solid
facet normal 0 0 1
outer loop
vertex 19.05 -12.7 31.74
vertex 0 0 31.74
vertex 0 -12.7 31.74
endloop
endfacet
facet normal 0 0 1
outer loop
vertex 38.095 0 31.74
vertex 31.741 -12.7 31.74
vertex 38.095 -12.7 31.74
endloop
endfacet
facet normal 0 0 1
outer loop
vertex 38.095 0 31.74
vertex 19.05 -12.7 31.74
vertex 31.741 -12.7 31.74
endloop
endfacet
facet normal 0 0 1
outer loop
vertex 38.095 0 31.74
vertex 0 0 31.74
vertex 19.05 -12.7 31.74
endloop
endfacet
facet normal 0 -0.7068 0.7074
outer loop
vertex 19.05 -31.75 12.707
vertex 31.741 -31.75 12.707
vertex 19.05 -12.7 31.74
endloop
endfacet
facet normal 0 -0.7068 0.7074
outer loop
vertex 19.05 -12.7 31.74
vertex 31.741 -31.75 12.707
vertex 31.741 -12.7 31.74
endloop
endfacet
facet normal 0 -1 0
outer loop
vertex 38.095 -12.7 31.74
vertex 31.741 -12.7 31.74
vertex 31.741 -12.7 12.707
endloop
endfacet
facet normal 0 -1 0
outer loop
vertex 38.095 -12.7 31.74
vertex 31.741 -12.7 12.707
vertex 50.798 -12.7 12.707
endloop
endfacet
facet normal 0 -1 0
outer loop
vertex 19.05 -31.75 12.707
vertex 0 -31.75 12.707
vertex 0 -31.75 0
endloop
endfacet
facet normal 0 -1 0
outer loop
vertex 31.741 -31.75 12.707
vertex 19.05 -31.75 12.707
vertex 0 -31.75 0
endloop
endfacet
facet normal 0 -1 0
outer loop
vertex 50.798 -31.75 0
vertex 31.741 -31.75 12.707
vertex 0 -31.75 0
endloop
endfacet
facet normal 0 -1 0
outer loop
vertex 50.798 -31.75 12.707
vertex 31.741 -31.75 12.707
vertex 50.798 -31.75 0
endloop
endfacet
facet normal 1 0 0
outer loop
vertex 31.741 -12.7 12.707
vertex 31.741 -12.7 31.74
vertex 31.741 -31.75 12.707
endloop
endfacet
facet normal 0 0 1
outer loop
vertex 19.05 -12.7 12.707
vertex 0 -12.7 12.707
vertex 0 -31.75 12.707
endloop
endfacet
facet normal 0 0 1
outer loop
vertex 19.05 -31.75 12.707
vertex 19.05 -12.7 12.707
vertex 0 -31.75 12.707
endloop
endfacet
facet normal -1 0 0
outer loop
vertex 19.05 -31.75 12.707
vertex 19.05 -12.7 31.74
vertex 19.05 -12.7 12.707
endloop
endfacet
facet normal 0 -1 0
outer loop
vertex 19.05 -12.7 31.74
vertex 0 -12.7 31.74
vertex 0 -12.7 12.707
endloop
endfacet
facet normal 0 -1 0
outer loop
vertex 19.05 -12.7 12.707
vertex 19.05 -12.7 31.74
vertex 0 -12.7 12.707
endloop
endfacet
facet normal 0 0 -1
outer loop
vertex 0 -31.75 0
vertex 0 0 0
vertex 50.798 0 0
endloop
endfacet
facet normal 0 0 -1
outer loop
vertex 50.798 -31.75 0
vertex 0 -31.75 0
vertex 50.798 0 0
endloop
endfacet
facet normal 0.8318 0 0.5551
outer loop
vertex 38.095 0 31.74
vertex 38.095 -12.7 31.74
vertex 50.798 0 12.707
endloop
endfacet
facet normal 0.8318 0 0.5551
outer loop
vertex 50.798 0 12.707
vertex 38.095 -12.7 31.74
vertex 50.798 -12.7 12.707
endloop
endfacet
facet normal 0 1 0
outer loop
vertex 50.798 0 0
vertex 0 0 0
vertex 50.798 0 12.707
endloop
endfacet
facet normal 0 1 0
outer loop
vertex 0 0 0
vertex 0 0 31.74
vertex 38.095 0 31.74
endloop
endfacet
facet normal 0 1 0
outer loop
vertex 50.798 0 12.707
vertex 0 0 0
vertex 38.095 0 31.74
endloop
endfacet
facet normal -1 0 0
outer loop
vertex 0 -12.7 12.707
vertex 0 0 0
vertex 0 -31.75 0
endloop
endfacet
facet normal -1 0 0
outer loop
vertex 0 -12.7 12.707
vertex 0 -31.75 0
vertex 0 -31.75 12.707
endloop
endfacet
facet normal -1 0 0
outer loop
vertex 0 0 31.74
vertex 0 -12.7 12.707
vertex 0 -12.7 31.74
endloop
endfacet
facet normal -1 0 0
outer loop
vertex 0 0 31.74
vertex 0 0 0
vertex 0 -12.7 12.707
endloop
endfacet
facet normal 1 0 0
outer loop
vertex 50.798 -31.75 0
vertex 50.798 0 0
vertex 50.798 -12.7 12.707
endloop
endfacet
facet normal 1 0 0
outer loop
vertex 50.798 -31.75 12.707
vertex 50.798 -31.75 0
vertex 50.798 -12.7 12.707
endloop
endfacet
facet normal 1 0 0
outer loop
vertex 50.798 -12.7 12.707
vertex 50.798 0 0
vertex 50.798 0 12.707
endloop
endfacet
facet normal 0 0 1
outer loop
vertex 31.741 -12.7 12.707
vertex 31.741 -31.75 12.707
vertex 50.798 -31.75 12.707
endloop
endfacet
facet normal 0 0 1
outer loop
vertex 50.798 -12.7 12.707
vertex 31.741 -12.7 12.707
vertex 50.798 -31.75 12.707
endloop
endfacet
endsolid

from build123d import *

# Parameters (mm, degrees)
F0_W     = 50.797824
F0_H     = 31.739995
F1_DEPTH = 31.75
F3_DEPTH = 31.751
F5_DEPTH = 19.05
F7_DEPTH = 31.742131
F9_DEPTH = 19.05


with BuildPart() as f1:
    # F0 (on Front) → F1 (new body)
    with BuildSketch(Plane.XZ):
        with Locations((25.398912, 15.869997)):
            Rectangle(F0_W, F0_H)
    extrude(amount=F1_DEPTH)

    # F2 (on face) → F3 (cut, through all)
    with BuildSketch(Plane.XZ.offset(31.75)):
        Polygon((50.797824, 31.739995), (38.095411, 31.739995), (50.797824, 12.707176), align=None)
    extrude(amount=-F3_DEPTH, mode=Mode.SUBTRACT)

    # F4 (on face) → F5 (cut)
    with BuildSketch(Plane.XZ.offset(31.75)):
        Polygon((31.741131, 12.707176), (50.797824, 12.707176), (38.095411, 31.739995), (31.741131, 31.739995), align=None)
    extrude(amount=-F5_DEPTH, mode=Mode.SUBTRACT)

    # F6 (on face) → F7 (cut, through all)
    with BuildSketch(Plane.YZ.offset(31.741131)):
        Polygon((-31.75, 12.707176), (-12.7, 31.739995), (-31.75, 31.739995), align=None)
    extrude(amount=-F7_DEPTH, mode=Mode.SUBTRACT)

    # F8 (on face) → F9 (cut)
    with BuildSketch(Plane(origin=(0, 0, 0), x_dir=(0, -1, 0), z_dir=(-1, 0, 0))):
        Polygon((12.7, 12.707176), (31.75, 12.707176), (12.7, 31.739995), align=None)
    extrude(amount=-F9_DEPTH, mode=Mode.SUBTRACT)


solid = f1.part
